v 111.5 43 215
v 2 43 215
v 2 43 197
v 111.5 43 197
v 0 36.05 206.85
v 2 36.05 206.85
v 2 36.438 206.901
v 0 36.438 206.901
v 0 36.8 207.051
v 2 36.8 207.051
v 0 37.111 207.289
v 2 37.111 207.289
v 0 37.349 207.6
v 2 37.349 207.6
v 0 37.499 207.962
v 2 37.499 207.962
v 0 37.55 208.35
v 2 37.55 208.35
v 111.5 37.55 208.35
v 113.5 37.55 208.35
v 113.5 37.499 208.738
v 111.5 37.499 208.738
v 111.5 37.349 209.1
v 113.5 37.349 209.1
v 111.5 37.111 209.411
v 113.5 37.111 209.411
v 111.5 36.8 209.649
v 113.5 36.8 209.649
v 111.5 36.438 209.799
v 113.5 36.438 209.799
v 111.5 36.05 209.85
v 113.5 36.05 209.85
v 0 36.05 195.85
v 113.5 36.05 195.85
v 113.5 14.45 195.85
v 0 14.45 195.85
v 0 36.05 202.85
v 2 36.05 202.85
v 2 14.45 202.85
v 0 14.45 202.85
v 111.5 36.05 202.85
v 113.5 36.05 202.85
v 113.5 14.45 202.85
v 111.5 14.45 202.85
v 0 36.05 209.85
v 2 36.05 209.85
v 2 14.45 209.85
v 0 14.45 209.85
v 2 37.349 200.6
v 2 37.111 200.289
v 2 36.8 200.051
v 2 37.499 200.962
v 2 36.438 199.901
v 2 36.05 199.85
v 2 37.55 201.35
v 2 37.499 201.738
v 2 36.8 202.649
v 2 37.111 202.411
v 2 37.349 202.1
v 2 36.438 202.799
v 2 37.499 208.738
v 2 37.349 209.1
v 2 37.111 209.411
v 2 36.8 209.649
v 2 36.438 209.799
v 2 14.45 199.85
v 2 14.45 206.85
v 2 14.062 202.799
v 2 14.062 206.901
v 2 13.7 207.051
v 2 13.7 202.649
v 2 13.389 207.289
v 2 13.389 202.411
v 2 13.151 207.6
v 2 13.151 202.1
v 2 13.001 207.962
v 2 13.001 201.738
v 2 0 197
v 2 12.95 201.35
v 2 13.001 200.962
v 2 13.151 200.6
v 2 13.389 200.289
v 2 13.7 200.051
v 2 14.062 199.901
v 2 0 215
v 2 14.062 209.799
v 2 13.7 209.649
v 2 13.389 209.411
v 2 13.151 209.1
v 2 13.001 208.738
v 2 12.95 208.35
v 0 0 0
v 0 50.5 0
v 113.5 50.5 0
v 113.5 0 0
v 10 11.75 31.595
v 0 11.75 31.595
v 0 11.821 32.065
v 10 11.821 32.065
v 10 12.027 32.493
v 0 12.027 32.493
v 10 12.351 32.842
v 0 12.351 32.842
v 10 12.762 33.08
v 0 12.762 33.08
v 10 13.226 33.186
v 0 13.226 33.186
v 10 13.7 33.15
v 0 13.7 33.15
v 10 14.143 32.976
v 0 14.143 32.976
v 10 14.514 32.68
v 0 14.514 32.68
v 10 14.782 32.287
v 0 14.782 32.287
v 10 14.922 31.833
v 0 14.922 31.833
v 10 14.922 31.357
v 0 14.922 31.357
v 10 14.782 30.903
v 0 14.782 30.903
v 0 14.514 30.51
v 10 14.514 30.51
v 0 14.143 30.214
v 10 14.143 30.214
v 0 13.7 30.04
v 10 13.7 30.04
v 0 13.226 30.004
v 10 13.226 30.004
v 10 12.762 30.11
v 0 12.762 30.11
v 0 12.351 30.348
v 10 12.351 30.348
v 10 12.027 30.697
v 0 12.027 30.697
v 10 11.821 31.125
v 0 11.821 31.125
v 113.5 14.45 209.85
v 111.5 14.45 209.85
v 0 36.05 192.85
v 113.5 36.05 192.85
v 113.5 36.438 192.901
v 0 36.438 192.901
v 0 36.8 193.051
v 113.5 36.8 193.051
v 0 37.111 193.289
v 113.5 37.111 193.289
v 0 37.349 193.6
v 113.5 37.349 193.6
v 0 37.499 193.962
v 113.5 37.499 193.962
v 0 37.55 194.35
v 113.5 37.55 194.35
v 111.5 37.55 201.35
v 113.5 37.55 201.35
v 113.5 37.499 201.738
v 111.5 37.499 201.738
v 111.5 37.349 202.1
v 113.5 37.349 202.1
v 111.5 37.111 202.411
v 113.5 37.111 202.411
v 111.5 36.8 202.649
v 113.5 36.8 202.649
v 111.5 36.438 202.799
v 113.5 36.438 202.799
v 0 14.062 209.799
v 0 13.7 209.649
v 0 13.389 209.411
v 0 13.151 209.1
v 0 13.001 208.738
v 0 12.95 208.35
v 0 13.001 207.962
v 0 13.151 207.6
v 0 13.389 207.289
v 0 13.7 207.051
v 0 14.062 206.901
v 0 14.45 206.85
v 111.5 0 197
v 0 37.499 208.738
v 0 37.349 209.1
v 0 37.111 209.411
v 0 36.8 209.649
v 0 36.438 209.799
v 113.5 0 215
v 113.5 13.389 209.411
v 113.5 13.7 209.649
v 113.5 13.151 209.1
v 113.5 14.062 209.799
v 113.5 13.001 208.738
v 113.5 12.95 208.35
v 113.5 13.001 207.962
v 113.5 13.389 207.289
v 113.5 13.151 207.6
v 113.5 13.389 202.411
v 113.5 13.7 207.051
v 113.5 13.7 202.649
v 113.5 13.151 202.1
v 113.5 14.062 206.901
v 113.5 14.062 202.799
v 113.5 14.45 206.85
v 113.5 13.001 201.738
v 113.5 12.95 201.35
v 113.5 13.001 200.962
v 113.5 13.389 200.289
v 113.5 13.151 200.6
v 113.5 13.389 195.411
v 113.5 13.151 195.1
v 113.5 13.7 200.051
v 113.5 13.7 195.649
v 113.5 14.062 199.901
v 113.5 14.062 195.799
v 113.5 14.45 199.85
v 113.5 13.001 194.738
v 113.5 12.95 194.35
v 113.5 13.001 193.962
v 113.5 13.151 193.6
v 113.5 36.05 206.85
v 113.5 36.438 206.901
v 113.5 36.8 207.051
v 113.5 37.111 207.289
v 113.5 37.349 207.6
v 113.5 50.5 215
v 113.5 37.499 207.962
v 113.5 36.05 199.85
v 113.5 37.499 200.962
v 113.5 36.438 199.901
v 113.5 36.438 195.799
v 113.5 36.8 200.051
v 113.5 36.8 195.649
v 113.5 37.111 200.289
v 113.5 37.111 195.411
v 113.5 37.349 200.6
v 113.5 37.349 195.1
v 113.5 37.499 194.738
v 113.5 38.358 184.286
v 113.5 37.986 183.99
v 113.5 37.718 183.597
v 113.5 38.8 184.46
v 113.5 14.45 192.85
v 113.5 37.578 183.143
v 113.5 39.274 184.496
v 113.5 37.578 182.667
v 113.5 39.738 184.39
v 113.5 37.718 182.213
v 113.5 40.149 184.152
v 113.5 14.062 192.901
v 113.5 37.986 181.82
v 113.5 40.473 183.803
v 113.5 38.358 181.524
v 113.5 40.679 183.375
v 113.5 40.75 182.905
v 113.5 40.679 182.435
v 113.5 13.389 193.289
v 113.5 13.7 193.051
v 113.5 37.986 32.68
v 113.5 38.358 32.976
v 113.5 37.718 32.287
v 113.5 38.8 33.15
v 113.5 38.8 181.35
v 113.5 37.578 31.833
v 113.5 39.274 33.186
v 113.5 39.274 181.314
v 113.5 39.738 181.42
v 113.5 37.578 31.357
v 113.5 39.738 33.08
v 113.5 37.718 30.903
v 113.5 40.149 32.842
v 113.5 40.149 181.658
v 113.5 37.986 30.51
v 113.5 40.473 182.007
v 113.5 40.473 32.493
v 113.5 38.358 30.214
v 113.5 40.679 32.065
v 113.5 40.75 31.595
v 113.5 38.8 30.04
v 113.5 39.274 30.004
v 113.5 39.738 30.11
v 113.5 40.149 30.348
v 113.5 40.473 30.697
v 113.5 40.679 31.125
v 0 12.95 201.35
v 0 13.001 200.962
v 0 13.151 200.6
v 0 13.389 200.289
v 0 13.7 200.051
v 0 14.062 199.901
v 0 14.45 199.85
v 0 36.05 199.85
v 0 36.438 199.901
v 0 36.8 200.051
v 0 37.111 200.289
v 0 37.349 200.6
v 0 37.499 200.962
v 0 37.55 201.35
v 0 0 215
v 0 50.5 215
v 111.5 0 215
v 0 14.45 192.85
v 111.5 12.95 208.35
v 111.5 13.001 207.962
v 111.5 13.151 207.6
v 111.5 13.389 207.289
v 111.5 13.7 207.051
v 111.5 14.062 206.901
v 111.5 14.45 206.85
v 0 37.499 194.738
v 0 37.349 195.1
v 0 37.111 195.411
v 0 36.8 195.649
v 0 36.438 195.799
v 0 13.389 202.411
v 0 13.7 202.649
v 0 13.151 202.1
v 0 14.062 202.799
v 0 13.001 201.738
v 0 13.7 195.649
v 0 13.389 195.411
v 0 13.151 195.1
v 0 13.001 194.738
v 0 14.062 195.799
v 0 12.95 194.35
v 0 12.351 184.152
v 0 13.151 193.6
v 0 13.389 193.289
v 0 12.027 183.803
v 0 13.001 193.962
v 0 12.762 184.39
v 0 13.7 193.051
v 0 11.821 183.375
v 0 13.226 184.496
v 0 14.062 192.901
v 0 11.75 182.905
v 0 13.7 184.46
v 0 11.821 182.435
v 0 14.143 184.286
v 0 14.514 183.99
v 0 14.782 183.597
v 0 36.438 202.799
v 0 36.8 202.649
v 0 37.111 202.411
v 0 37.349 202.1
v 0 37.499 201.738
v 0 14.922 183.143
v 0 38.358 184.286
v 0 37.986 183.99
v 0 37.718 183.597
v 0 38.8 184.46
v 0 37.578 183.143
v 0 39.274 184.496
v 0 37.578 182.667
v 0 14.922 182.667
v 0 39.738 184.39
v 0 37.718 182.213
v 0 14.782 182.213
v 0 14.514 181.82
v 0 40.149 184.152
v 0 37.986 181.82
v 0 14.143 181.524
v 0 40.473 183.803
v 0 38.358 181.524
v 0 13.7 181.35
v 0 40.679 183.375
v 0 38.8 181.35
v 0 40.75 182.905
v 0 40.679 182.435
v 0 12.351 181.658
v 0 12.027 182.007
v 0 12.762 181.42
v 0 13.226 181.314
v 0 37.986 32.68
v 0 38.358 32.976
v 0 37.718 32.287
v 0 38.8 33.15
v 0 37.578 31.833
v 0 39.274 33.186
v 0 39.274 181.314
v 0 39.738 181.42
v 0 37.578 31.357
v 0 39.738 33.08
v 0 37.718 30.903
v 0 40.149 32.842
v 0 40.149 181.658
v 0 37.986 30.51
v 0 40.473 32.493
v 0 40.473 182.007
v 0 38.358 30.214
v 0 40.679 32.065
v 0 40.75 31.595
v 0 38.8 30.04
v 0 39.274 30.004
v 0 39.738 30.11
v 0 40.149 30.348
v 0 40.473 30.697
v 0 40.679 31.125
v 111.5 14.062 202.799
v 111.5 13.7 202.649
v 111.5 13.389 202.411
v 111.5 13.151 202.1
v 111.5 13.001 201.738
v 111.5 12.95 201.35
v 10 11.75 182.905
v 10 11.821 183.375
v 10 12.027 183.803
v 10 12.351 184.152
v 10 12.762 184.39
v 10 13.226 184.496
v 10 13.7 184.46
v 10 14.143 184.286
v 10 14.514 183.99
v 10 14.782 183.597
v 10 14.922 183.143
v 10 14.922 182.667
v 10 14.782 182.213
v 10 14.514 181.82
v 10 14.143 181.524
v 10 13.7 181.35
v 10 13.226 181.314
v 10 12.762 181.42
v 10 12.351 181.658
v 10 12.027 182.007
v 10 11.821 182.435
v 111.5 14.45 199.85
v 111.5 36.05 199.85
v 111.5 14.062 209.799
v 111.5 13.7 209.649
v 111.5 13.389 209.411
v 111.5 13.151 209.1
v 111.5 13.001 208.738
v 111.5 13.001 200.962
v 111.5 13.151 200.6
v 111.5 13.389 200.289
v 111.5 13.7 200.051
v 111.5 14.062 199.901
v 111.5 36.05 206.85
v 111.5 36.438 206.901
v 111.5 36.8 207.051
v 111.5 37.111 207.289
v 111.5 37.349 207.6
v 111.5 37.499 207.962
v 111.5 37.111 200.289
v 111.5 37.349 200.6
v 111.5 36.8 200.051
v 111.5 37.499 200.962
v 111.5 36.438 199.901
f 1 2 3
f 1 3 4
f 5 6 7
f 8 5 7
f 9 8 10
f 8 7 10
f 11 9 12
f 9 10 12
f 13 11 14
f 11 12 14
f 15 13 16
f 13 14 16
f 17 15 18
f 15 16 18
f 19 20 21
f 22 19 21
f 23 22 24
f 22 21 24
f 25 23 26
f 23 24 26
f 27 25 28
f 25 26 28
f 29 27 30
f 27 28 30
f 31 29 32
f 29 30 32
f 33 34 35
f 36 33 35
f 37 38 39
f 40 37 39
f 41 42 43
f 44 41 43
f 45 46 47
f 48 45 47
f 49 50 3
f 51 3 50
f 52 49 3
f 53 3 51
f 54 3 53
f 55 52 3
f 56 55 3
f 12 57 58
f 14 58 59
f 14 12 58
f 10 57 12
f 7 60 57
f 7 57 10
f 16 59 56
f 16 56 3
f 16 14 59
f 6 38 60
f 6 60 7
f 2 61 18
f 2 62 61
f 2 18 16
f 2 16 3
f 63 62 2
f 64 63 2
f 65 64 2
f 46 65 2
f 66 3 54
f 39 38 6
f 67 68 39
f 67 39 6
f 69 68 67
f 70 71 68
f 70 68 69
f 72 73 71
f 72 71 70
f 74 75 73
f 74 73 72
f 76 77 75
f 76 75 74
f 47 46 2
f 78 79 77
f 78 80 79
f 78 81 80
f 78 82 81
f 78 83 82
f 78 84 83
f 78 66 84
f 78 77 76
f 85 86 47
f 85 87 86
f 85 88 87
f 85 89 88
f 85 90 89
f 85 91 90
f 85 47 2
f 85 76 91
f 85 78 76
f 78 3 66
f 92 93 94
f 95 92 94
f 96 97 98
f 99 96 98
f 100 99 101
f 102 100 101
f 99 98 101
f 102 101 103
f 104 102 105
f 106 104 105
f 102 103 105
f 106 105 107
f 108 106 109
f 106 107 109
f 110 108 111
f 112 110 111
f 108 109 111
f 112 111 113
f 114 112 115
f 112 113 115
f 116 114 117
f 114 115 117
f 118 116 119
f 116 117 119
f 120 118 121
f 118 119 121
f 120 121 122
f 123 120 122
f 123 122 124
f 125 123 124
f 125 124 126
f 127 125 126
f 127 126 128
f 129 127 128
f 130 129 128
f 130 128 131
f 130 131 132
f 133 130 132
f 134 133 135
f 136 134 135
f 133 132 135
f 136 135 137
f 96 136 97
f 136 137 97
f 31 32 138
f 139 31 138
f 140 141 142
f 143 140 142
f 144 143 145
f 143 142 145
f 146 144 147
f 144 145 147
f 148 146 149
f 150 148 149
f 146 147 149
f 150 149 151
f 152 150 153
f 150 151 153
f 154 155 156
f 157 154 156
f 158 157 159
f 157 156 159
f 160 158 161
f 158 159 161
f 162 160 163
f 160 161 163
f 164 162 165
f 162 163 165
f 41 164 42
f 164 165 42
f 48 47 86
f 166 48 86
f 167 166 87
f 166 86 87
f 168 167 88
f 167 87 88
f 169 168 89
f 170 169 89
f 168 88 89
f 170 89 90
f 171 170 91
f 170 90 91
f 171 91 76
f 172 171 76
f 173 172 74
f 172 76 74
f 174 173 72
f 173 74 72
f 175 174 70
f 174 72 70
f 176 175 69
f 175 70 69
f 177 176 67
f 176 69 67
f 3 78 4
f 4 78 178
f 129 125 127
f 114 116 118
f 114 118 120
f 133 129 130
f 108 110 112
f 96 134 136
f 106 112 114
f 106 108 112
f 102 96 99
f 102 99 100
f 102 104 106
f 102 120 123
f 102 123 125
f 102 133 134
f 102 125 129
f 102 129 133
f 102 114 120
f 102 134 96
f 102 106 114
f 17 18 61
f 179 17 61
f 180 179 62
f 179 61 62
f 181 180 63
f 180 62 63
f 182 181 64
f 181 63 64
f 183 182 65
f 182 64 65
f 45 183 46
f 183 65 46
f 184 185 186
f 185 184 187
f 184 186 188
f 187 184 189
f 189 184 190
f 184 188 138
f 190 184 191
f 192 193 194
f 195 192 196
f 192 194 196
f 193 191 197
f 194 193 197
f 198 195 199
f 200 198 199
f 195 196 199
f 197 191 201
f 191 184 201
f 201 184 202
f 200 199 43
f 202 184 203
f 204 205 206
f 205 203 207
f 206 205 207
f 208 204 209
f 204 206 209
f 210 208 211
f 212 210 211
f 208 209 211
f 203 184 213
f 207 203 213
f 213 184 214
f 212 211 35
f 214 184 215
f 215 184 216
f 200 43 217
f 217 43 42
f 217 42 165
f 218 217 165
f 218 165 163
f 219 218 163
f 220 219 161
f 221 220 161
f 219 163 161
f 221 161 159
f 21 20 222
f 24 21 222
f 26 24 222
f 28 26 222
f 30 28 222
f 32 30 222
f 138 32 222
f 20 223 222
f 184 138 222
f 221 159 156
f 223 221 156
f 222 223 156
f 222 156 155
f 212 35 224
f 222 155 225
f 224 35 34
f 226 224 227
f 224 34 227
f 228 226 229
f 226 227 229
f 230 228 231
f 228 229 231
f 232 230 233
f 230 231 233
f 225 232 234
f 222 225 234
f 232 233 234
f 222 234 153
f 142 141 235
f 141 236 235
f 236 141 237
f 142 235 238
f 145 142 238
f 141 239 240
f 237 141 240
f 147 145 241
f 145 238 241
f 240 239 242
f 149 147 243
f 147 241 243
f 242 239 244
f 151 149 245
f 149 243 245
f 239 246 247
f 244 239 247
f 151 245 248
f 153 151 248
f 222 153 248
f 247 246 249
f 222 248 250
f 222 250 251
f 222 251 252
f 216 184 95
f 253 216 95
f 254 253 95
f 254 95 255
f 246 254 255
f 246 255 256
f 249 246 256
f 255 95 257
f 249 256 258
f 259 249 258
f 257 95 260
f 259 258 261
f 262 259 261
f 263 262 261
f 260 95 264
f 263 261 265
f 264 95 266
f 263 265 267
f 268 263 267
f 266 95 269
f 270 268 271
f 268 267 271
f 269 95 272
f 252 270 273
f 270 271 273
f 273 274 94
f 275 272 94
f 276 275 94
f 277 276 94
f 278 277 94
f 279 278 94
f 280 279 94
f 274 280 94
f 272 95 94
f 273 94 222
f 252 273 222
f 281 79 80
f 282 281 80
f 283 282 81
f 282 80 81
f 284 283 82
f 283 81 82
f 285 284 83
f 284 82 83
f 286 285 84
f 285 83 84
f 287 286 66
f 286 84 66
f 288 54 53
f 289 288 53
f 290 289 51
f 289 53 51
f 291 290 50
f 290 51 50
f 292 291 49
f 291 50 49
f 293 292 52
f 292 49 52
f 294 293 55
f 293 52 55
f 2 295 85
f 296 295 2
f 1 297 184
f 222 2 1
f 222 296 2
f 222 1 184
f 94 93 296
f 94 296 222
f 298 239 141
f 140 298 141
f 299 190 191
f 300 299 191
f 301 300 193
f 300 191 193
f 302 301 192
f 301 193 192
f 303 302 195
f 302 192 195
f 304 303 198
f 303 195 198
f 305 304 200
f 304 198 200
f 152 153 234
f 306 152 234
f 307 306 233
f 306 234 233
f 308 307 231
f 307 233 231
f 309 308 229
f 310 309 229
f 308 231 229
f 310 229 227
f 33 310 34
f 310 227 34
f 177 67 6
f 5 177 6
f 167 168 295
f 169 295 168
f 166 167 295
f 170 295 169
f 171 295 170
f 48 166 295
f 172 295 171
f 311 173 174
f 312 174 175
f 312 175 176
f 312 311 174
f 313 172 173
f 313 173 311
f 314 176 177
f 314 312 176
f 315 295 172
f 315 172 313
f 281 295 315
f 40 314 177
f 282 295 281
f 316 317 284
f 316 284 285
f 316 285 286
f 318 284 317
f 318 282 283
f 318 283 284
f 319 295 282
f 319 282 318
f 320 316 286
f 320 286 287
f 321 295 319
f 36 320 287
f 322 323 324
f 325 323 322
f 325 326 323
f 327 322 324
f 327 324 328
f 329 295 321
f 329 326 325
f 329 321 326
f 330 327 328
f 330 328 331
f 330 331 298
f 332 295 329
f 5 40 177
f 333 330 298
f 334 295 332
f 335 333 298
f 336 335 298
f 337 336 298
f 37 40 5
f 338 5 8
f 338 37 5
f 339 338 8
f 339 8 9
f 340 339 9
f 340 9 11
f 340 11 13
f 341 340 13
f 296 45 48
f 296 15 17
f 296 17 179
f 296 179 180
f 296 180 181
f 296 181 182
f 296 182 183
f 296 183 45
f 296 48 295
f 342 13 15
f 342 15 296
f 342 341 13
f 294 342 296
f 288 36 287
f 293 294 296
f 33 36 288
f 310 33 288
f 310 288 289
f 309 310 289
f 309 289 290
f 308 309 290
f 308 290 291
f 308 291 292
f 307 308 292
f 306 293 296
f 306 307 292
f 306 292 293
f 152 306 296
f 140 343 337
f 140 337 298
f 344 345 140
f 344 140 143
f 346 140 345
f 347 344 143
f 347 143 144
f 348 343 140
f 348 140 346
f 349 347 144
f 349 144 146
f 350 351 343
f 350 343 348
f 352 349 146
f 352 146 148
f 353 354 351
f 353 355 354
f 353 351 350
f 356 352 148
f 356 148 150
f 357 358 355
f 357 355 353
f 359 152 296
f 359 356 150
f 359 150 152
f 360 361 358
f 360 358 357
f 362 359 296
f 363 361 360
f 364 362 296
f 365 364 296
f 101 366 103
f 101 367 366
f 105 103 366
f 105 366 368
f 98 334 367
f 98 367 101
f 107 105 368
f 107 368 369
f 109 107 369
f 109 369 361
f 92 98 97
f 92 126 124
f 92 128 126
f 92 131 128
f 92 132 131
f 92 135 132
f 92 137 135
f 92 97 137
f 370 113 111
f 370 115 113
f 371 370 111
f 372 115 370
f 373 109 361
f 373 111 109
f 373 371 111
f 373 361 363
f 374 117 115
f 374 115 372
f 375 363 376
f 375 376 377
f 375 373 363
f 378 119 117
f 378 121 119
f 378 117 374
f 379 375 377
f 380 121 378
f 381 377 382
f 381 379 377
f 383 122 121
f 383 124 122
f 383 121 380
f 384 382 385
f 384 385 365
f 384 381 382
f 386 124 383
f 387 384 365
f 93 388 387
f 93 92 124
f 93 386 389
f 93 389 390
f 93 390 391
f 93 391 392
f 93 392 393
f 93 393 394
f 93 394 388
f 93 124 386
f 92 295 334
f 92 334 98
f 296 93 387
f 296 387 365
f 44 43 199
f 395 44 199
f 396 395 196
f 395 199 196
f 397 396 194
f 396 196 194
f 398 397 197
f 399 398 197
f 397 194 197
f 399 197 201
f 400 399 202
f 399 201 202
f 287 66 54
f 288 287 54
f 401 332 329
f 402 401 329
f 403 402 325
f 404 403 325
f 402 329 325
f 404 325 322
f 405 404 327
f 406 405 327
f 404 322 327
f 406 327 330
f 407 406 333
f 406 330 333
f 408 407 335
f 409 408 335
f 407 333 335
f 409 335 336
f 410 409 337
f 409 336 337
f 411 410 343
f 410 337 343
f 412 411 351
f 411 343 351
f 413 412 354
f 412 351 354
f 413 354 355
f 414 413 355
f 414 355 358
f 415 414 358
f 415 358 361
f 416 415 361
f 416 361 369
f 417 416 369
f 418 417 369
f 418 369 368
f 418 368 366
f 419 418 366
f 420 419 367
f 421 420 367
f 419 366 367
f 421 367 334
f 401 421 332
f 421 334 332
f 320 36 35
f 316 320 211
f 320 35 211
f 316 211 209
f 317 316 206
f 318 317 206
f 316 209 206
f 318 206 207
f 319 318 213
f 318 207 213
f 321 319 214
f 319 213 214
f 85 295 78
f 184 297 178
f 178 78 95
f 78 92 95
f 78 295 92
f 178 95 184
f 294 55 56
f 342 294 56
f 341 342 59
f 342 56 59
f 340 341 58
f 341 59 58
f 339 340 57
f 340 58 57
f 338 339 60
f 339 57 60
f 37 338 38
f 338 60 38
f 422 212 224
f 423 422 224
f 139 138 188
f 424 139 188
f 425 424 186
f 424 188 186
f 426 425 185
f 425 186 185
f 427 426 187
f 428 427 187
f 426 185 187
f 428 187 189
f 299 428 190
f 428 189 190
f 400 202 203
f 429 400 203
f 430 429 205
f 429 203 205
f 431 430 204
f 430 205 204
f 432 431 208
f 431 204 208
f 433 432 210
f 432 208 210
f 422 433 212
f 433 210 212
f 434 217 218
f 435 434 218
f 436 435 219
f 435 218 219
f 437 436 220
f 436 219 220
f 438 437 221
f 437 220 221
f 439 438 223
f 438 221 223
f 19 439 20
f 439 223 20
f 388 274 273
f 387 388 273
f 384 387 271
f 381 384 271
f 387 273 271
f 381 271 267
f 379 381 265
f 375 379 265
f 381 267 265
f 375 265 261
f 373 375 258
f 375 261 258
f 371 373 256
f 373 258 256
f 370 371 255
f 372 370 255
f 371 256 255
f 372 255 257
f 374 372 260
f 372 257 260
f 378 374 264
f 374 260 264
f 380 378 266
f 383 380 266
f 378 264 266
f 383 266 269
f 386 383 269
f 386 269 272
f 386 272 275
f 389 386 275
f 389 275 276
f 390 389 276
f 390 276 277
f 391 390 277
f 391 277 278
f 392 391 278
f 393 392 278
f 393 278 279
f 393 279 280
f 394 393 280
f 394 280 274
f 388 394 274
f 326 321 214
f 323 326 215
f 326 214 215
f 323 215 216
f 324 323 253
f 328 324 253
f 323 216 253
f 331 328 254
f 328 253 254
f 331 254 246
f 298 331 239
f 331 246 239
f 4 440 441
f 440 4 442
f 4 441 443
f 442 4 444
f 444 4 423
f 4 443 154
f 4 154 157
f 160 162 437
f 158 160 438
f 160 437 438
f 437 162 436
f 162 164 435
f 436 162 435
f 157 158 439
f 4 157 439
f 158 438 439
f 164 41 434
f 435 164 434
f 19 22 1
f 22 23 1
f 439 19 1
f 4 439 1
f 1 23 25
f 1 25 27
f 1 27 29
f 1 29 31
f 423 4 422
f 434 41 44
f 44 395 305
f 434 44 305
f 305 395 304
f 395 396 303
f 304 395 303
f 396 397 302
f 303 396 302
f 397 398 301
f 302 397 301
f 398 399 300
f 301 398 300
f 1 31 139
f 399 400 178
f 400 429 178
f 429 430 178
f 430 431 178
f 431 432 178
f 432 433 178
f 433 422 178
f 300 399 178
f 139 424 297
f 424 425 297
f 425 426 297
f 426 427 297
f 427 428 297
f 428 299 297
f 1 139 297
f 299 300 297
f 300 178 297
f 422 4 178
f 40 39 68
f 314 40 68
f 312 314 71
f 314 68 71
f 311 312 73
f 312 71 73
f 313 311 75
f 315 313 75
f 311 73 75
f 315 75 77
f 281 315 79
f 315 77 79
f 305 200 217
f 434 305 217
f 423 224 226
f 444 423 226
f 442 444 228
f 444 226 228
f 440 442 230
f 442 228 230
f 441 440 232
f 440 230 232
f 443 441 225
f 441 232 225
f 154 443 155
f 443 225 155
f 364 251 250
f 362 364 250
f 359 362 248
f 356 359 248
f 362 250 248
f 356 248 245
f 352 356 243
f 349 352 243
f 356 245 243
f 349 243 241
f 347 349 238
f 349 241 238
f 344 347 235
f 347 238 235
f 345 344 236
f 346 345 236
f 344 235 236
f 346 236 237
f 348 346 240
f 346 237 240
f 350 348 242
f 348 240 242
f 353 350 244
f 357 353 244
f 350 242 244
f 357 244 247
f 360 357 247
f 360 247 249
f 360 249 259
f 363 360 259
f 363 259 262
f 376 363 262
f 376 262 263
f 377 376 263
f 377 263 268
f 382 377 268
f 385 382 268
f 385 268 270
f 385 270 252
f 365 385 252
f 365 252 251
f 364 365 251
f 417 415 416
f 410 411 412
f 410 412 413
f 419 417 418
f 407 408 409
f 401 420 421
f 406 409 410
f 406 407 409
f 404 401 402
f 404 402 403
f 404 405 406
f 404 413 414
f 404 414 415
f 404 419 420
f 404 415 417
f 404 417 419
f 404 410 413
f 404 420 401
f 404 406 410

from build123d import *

# Parameters (mm, degrees)
F0_W     = 113.5
F0_H     = 50.5
F1_DEPTH = 215
F3_DEPTH = 113.501
F4_W     = 109.5
F4_H     = 18
F5_DEPTH = 43
F6_R     = 1.595
F7_DEPTH = 113.501
F8_R     = 1.595
F9_DEPTH = 10


with BuildPart() as f1:
    # F0 (on Top) → F1 (new body)
    with BuildSketch(Plane.XY):
        with Locations((56.75, 25.25)):
            Rectangle(F0_W, F0_H)
    extrude(amount=F1_DEPTH)

    # F2 (on face) → F3 (cut, through all)
    with BuildSketch(Plane.YZ.offset(113.5)):
        with BuildLine():
            Line((36.05, 209.85), (14.45, 209.85))
            ThreePointArc((14.45, 209.85), (13.38934, 209.41066), (12.95, 208.35))
            ThreePointArc((12.95, 208.35), (13.38934, 207.28934), (14.45, 206.85))
            Line((14.45, 206.85), (36.05, 206.85))
            ThreePointArc((36.05, 206.85), (37.11066, 207.28934), (37.55, 208.35))
            ThreePointArc((37.55, 208.35), (37.11066, 209.41066), (36.05, 209.85))
        make_face()
        with BuildLine():
            ThreePointArc((12.95, 201.35), (13.38934, 200.28934), (14.45, 199.85))
            Line((14.45, 199.85), (36.05, 199.85))
            ThreePointArc((36.05, 199.85), (37.11066, 200.28934), (37.55, 201.35))
            ThreePointArc((37.55, 201.35), (37.11066, 202.41066), (36.05, 202.85))
            Line((36.05, 202.85), (14.45, 202.85))
            ThreePointArc((14.45, 202.85), (13.38934, 202.41066), (12.95, 201.35))
        make_face()
        with BuildLine():
            ThreePointArc((12.95, 194.35), (13.38934, 193.28934), (14.45, 192.85))
            Line((14.45, 192.85), (36.05, 192.85))
            ThreePointArc((36.05, 192.85), (37.11066, 193.28934), (37.55, 194.35))
            ThreePointArc((37.55, 194.35), (37.11066, 195.41066), (36.05, 195.85))
            Line((36.05, 195.85), (14.45, 195.85))
            ThreePointArc((14.45, 195.85), (13.38934, 195.41066), (12.95, 194.35))
        make_face()
    extrude(amount=-F3_DEPTH, mode=Mode.SUBTRACT)

    # F4 (on face) → F5 (cut)
    with BuildSketch(Plane.XZ):
        with Locations((56.75, 206)):
            Rectangle(F4_W, F4_H)
    extrude(amount=-F5_DEPTH, mode=Mode.SUBTRACT)

    # F6 (on face) → F7 (cut, through all)
    with BuildSketch(Plane.YZ.offset(113.5)):
        with Locations((39.155, 31.595)):
            Circle(F6_R)
        with Locations((39.155, 182.905)):
            Circle(F6_R)
    extrude(amount=-F7_DEPTH, mode=Mode.SUBTRACT)

    # F8 (on face) → F9 (cut)
    with BuildSketch(Plane(origin=(0, 0, 0), x_dir=(0, -1, 0), z_dir=(-1, 0, 0))):
        with Locations((-13.345, 182.905)):
            Circle(F8_R)
        with Locations((-13.345, 31.595)):
            Circle(F8_R)
    extrude(amount=-F9_DEPTH, mode=Mode.SUBTRACT)


solid = f1.part
